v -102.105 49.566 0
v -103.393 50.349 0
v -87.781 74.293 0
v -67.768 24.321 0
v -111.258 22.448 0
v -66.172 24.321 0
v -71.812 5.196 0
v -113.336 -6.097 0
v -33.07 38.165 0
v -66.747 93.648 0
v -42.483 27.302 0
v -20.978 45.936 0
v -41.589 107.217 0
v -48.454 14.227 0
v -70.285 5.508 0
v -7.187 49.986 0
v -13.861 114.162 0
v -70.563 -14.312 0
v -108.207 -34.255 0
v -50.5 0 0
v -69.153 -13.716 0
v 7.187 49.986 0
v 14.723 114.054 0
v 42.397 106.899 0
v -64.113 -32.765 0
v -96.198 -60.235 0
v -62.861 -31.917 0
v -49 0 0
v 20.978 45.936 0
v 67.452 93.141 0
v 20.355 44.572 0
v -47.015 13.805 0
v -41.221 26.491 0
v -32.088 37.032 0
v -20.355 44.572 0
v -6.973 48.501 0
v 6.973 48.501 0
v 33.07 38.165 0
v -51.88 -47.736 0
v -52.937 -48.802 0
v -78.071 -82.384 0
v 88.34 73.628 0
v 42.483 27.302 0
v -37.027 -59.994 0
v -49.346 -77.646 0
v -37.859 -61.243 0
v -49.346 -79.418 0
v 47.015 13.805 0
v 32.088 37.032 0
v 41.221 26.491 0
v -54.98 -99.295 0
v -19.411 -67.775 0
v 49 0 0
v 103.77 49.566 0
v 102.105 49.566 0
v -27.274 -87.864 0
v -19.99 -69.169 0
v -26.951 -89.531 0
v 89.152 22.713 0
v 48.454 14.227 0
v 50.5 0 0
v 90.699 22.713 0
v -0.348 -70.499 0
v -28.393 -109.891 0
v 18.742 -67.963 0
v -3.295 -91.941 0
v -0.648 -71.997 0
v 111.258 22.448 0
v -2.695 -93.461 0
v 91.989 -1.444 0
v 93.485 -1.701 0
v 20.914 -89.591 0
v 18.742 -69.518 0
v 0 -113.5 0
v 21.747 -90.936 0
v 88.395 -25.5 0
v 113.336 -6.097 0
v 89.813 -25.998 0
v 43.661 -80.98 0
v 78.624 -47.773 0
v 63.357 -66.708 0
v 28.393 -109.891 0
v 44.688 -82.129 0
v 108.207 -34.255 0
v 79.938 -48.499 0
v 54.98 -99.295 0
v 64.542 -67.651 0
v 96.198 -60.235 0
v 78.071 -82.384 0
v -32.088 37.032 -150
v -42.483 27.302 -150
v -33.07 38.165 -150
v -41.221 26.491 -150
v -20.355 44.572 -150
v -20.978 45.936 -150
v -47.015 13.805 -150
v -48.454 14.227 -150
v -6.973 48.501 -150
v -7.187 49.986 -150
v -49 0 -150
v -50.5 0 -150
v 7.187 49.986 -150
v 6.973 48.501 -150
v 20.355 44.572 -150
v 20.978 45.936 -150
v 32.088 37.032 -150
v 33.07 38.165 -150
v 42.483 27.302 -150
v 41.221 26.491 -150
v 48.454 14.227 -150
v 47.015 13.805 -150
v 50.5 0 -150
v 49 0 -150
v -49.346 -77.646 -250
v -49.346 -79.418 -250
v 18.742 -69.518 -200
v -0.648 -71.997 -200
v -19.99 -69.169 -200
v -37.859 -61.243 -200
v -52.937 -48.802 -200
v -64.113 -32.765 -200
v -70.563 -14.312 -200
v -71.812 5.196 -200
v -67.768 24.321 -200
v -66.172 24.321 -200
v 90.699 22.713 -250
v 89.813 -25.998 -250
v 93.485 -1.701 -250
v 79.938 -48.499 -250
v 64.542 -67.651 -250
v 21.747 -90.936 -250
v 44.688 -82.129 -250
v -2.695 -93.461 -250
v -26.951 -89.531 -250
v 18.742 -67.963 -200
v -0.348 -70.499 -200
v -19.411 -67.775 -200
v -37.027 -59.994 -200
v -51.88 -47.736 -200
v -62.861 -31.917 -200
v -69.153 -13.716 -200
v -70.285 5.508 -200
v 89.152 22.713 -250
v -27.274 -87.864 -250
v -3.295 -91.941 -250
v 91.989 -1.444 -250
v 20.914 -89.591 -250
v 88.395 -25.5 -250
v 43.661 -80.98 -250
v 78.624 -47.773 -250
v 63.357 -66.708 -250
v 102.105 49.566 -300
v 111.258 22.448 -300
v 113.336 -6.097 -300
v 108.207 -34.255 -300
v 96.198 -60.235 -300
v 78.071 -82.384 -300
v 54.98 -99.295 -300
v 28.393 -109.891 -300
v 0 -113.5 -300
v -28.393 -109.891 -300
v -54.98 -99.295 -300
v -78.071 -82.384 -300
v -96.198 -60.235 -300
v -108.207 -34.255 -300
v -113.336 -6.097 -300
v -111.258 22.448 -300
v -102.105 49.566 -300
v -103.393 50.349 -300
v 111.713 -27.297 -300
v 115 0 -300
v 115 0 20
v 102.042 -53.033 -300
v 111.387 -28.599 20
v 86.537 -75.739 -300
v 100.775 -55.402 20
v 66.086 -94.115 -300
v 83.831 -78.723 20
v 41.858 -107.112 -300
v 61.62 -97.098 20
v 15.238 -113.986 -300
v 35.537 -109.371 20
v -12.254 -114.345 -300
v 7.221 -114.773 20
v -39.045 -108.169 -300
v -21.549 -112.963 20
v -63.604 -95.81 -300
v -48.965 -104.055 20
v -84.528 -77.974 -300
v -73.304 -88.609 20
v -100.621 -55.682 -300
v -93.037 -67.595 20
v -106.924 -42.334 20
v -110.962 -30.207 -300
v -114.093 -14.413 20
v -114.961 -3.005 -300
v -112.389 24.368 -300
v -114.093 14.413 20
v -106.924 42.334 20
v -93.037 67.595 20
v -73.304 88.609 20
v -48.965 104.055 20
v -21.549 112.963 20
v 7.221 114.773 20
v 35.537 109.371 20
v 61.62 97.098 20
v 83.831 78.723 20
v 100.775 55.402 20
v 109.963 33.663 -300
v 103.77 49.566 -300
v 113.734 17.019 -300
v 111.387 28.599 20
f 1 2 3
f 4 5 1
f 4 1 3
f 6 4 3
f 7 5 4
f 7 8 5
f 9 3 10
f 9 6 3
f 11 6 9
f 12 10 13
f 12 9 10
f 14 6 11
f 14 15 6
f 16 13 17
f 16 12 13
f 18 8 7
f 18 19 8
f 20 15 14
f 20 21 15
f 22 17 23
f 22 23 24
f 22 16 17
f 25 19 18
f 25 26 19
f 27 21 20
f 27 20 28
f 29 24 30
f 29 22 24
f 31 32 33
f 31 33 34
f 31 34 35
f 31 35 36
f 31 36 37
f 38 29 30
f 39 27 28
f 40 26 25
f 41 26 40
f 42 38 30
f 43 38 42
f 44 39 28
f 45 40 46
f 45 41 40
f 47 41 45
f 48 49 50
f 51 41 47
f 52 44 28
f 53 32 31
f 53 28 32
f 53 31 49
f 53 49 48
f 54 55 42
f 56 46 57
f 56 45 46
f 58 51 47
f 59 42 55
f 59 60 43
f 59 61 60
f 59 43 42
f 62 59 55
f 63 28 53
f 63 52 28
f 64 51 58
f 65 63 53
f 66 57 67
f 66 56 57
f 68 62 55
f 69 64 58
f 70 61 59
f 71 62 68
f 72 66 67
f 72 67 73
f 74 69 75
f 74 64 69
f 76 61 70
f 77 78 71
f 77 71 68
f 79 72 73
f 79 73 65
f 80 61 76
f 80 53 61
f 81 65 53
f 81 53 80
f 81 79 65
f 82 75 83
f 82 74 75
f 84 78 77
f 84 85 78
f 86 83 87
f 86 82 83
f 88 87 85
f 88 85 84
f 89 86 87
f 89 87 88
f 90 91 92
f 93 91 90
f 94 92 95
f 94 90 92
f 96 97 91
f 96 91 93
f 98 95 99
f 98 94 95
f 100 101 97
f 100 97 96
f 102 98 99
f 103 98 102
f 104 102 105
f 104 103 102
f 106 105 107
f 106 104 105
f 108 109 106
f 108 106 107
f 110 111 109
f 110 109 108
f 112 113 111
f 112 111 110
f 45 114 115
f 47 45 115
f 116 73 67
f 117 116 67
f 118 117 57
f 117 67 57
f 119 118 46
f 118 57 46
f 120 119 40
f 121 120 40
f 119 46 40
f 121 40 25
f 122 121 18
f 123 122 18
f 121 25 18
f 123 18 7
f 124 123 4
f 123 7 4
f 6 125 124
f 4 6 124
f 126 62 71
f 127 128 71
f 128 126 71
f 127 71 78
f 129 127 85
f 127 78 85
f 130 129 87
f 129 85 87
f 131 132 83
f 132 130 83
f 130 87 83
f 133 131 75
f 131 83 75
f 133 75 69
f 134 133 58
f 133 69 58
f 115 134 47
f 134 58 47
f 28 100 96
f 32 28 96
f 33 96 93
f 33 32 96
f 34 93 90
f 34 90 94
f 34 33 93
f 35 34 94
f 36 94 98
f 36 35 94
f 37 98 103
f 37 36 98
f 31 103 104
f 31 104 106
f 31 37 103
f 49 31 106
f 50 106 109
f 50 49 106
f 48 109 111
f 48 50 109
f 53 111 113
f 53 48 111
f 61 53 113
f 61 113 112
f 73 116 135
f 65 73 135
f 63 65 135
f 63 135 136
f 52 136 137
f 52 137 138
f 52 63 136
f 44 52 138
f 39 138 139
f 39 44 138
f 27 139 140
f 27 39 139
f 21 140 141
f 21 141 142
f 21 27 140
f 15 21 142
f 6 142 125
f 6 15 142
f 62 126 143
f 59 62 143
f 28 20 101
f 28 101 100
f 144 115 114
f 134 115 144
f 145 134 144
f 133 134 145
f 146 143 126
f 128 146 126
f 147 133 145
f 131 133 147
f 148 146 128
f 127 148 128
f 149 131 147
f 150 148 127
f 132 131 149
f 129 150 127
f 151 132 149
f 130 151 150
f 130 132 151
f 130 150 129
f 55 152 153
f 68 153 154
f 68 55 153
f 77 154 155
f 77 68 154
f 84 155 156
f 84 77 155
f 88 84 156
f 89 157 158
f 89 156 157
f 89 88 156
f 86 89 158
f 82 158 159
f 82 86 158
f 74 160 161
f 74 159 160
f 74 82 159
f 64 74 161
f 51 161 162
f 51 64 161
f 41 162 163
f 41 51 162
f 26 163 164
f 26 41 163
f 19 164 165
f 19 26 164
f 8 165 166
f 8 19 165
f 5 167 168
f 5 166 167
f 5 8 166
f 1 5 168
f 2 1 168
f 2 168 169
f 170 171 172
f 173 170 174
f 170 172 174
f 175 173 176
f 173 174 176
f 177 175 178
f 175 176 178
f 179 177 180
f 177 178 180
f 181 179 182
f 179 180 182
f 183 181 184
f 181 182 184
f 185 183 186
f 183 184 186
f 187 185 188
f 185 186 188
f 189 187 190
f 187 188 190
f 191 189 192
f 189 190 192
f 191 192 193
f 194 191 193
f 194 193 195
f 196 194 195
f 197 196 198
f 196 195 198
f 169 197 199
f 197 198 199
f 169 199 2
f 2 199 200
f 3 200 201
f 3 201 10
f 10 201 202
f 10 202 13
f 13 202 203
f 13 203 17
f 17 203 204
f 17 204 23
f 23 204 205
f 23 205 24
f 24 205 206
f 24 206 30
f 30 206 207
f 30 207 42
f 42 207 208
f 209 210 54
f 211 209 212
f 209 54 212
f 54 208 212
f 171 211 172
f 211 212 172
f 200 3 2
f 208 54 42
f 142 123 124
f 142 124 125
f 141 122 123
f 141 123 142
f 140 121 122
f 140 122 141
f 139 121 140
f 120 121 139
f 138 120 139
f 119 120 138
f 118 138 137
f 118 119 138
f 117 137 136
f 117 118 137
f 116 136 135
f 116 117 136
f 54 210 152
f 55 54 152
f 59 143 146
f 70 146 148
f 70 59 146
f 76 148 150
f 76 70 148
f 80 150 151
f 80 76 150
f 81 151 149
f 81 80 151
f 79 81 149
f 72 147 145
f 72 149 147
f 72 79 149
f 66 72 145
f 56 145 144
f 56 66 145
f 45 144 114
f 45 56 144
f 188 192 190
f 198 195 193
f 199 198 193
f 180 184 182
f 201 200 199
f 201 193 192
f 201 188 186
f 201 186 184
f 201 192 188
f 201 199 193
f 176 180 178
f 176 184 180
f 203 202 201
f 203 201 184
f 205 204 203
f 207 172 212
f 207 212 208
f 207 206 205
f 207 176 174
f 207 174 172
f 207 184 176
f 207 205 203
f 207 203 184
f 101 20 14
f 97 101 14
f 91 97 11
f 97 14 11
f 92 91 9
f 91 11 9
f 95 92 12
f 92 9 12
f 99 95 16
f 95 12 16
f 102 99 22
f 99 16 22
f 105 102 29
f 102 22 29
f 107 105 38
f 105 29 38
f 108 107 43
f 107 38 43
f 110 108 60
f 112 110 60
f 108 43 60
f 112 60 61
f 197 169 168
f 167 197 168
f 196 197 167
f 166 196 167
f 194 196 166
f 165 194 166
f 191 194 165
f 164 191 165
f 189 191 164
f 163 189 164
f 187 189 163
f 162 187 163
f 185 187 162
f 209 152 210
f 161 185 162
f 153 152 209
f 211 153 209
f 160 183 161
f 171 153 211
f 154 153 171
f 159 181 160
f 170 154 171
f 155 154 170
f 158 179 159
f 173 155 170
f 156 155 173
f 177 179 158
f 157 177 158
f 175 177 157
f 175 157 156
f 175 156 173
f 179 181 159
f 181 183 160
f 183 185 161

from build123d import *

# Parameters (mm, degrees)
F0_R      = 115
F1_DEPTH  = 20
F2_R      = 115
F2_R_2    = 113.5
F3_DEPTH  = 300
F4_R      = 72
F4_R_2    = 70.5
F5_DEPTH  = 200
F6_R      = 50.5
F6_R_2    = 49
F7_DEPTH  = 150
F8_R      = 93.5
F8_R_2    = 92
F9_DEPTH  = 250
F11_DEPTH = 300
F13_DEPTH = 250
F15_DEPTH = 200
F17_DEPTH = 150


with BuildPart() as f1:
    # F0 (on Top) → F1 (new body)
    with BuildSketch(Plane.XY):
        Circle(F0_R)
    extrude(amount=F1_DEPTH)

    # F2 (on face) → F3 (join)
    with BuildSketch(Plane(origin=(0, 0, 0), x_dir=(1, 0, 0), z_dir=(0, 0, -1))):
        Circle(F2_R)
        Circle(F2_R_2, mode=Mode.SUBTRACT)
    extrude(amount=F3_DEPTH)

    # F4 (on face) → F5 (join)
    with BuildSketch(Plane(origin=(0, 0, 0), x_dir=(1, 0, 0), z_dir=(0, 0, -1))):
        Circle(F4_R)
        Circle(F4_R_2, mode=Mode.SUBTRACT)
    extrude(amount=F5_DEPTH)

    # F6 (on face) → F7 (join)
    with BuildSketch(Plane(origin=(0, 0, 0), x_dir=(1, 0, 0), z_dir=(0, 0, -1))):
        Circle(F6_R)
        Circle(F6_R_2, mode=Mode.SUBTRACT)
    extrude(amount=F7_DEPTH)

    # F8 (on face) → F9 (join)
    with BuildSketch(Plane(origin=(0, 0, 0), x_dir=(1, 0, 0), z_dir=(0, 0, -1))):
        Circle(F8_R)
        Circle(F8_R_2, mode=Mode.SUBTRACT)
    extrude(amount=F9_DEPTH)

    # F10 (on face) → F11 (cut)
    with BuildSketch(Plane(origin=(0, 0, -300), x_dir=(1, 0, 0), z_dir=(0, 0, -1))):
        with BuildLine():
            Line((-102.1050381255, -49.5662303328), (-103.3925876319, -50.3485136104))
            ThreePointArc((-103.3925876319, -50.3485136104), (0.4342578791, -114.9991800844), (103.7698839288, -49.5662303328))
            Line((103.7698839288, -49.5662303328), (102.1050381255, -49.5662303328))
            ThreePointArc((102.1050381255, -49.5662303328), (0, -113.5), (-102.1050381255, -49.5662303328))
        make_face()
    extrude(amount=-F11_DEPTH, mode=Mode.SUBTRACT)

    # F12 (on face) → F13 (cut)
    with BuildSketch(Plane(origin=(0, 0, -250), x_dir=(1, 0, 0), z_dir=(0, 0, -1))):
        with BuildLine():
            ThreePointArc((-49.3462659465, 79.4178571679), (-55.0925678888, -75.5450790152), (90.6993695659, -22.7128677261))
            Line((90.6993695659, -22.7128677261), (89.1522609902, -22.7128677261))
            ThreePointArc((89.1522609902, -22.7128677261), (-53.9825837089, -74.4975211408), (-49.3462659465, 77.6462879804))
            Line((-49.3462659465, 77.6462879804), (-49.3462659465, 79.4178571679))
        make_face()
    extrude(amount=-F13_DEPTH, mode=Mode.SUBTRACT)

    # F14 (on face) → F15 (cut)
    with BuildSketch(Plane(origin=(0, 0, -200), x_dir=(1, 0, 0), z_dir=(0, 0, -1))):
        with BuildLine():
            Line((-66.1720512268, -24.3209711245), (-67.7679154435, -24.3209711245))
            ThreePointArc((-67.7679154435, -24.3209711245), (12.3432185443, -70.9340888147), (72, 0))
            ThreePointArc((72, 0), (57.1551603856, 43.7868432442), (18.742009964, 69.5178902334))
            Line((18.742009964, 69.5178902334), (18.742009964, 67.96313017))
            ThreePointArc((18.742009964, 67.96313017), (56.0872610423, 42.713805131), (70.5, 0))
            ThreePointArc((70.5, 0), (12.3515259889, -69.4095800718), (-66.1720512268, -24.3209711245))
        make_face()
    extrude(amount=-F15_DEPTH, mode=Mode.SUBTRACT)

    # F16 (on face) → F17 (cut)
    with BuildSketch(Plane(origin=(0, 0, -150), x_dir=(1, 0, 0), z_dir=(0, 0, -1))):
        with BuildLine():
            ThreePointArc((50.5, 0), (0, 50.5), (-50.5, 0))
            Line((-50.5, 0), (-49, 0))
            ThreePointArc((-49, 0), (0, 49), (49, 0))
            Line((49, 0), (50.5, 0))
        make_face()
    extrude(amount=-F17_DEPTH, mode=Mode.SUBTRACT)


solid = f1.part
